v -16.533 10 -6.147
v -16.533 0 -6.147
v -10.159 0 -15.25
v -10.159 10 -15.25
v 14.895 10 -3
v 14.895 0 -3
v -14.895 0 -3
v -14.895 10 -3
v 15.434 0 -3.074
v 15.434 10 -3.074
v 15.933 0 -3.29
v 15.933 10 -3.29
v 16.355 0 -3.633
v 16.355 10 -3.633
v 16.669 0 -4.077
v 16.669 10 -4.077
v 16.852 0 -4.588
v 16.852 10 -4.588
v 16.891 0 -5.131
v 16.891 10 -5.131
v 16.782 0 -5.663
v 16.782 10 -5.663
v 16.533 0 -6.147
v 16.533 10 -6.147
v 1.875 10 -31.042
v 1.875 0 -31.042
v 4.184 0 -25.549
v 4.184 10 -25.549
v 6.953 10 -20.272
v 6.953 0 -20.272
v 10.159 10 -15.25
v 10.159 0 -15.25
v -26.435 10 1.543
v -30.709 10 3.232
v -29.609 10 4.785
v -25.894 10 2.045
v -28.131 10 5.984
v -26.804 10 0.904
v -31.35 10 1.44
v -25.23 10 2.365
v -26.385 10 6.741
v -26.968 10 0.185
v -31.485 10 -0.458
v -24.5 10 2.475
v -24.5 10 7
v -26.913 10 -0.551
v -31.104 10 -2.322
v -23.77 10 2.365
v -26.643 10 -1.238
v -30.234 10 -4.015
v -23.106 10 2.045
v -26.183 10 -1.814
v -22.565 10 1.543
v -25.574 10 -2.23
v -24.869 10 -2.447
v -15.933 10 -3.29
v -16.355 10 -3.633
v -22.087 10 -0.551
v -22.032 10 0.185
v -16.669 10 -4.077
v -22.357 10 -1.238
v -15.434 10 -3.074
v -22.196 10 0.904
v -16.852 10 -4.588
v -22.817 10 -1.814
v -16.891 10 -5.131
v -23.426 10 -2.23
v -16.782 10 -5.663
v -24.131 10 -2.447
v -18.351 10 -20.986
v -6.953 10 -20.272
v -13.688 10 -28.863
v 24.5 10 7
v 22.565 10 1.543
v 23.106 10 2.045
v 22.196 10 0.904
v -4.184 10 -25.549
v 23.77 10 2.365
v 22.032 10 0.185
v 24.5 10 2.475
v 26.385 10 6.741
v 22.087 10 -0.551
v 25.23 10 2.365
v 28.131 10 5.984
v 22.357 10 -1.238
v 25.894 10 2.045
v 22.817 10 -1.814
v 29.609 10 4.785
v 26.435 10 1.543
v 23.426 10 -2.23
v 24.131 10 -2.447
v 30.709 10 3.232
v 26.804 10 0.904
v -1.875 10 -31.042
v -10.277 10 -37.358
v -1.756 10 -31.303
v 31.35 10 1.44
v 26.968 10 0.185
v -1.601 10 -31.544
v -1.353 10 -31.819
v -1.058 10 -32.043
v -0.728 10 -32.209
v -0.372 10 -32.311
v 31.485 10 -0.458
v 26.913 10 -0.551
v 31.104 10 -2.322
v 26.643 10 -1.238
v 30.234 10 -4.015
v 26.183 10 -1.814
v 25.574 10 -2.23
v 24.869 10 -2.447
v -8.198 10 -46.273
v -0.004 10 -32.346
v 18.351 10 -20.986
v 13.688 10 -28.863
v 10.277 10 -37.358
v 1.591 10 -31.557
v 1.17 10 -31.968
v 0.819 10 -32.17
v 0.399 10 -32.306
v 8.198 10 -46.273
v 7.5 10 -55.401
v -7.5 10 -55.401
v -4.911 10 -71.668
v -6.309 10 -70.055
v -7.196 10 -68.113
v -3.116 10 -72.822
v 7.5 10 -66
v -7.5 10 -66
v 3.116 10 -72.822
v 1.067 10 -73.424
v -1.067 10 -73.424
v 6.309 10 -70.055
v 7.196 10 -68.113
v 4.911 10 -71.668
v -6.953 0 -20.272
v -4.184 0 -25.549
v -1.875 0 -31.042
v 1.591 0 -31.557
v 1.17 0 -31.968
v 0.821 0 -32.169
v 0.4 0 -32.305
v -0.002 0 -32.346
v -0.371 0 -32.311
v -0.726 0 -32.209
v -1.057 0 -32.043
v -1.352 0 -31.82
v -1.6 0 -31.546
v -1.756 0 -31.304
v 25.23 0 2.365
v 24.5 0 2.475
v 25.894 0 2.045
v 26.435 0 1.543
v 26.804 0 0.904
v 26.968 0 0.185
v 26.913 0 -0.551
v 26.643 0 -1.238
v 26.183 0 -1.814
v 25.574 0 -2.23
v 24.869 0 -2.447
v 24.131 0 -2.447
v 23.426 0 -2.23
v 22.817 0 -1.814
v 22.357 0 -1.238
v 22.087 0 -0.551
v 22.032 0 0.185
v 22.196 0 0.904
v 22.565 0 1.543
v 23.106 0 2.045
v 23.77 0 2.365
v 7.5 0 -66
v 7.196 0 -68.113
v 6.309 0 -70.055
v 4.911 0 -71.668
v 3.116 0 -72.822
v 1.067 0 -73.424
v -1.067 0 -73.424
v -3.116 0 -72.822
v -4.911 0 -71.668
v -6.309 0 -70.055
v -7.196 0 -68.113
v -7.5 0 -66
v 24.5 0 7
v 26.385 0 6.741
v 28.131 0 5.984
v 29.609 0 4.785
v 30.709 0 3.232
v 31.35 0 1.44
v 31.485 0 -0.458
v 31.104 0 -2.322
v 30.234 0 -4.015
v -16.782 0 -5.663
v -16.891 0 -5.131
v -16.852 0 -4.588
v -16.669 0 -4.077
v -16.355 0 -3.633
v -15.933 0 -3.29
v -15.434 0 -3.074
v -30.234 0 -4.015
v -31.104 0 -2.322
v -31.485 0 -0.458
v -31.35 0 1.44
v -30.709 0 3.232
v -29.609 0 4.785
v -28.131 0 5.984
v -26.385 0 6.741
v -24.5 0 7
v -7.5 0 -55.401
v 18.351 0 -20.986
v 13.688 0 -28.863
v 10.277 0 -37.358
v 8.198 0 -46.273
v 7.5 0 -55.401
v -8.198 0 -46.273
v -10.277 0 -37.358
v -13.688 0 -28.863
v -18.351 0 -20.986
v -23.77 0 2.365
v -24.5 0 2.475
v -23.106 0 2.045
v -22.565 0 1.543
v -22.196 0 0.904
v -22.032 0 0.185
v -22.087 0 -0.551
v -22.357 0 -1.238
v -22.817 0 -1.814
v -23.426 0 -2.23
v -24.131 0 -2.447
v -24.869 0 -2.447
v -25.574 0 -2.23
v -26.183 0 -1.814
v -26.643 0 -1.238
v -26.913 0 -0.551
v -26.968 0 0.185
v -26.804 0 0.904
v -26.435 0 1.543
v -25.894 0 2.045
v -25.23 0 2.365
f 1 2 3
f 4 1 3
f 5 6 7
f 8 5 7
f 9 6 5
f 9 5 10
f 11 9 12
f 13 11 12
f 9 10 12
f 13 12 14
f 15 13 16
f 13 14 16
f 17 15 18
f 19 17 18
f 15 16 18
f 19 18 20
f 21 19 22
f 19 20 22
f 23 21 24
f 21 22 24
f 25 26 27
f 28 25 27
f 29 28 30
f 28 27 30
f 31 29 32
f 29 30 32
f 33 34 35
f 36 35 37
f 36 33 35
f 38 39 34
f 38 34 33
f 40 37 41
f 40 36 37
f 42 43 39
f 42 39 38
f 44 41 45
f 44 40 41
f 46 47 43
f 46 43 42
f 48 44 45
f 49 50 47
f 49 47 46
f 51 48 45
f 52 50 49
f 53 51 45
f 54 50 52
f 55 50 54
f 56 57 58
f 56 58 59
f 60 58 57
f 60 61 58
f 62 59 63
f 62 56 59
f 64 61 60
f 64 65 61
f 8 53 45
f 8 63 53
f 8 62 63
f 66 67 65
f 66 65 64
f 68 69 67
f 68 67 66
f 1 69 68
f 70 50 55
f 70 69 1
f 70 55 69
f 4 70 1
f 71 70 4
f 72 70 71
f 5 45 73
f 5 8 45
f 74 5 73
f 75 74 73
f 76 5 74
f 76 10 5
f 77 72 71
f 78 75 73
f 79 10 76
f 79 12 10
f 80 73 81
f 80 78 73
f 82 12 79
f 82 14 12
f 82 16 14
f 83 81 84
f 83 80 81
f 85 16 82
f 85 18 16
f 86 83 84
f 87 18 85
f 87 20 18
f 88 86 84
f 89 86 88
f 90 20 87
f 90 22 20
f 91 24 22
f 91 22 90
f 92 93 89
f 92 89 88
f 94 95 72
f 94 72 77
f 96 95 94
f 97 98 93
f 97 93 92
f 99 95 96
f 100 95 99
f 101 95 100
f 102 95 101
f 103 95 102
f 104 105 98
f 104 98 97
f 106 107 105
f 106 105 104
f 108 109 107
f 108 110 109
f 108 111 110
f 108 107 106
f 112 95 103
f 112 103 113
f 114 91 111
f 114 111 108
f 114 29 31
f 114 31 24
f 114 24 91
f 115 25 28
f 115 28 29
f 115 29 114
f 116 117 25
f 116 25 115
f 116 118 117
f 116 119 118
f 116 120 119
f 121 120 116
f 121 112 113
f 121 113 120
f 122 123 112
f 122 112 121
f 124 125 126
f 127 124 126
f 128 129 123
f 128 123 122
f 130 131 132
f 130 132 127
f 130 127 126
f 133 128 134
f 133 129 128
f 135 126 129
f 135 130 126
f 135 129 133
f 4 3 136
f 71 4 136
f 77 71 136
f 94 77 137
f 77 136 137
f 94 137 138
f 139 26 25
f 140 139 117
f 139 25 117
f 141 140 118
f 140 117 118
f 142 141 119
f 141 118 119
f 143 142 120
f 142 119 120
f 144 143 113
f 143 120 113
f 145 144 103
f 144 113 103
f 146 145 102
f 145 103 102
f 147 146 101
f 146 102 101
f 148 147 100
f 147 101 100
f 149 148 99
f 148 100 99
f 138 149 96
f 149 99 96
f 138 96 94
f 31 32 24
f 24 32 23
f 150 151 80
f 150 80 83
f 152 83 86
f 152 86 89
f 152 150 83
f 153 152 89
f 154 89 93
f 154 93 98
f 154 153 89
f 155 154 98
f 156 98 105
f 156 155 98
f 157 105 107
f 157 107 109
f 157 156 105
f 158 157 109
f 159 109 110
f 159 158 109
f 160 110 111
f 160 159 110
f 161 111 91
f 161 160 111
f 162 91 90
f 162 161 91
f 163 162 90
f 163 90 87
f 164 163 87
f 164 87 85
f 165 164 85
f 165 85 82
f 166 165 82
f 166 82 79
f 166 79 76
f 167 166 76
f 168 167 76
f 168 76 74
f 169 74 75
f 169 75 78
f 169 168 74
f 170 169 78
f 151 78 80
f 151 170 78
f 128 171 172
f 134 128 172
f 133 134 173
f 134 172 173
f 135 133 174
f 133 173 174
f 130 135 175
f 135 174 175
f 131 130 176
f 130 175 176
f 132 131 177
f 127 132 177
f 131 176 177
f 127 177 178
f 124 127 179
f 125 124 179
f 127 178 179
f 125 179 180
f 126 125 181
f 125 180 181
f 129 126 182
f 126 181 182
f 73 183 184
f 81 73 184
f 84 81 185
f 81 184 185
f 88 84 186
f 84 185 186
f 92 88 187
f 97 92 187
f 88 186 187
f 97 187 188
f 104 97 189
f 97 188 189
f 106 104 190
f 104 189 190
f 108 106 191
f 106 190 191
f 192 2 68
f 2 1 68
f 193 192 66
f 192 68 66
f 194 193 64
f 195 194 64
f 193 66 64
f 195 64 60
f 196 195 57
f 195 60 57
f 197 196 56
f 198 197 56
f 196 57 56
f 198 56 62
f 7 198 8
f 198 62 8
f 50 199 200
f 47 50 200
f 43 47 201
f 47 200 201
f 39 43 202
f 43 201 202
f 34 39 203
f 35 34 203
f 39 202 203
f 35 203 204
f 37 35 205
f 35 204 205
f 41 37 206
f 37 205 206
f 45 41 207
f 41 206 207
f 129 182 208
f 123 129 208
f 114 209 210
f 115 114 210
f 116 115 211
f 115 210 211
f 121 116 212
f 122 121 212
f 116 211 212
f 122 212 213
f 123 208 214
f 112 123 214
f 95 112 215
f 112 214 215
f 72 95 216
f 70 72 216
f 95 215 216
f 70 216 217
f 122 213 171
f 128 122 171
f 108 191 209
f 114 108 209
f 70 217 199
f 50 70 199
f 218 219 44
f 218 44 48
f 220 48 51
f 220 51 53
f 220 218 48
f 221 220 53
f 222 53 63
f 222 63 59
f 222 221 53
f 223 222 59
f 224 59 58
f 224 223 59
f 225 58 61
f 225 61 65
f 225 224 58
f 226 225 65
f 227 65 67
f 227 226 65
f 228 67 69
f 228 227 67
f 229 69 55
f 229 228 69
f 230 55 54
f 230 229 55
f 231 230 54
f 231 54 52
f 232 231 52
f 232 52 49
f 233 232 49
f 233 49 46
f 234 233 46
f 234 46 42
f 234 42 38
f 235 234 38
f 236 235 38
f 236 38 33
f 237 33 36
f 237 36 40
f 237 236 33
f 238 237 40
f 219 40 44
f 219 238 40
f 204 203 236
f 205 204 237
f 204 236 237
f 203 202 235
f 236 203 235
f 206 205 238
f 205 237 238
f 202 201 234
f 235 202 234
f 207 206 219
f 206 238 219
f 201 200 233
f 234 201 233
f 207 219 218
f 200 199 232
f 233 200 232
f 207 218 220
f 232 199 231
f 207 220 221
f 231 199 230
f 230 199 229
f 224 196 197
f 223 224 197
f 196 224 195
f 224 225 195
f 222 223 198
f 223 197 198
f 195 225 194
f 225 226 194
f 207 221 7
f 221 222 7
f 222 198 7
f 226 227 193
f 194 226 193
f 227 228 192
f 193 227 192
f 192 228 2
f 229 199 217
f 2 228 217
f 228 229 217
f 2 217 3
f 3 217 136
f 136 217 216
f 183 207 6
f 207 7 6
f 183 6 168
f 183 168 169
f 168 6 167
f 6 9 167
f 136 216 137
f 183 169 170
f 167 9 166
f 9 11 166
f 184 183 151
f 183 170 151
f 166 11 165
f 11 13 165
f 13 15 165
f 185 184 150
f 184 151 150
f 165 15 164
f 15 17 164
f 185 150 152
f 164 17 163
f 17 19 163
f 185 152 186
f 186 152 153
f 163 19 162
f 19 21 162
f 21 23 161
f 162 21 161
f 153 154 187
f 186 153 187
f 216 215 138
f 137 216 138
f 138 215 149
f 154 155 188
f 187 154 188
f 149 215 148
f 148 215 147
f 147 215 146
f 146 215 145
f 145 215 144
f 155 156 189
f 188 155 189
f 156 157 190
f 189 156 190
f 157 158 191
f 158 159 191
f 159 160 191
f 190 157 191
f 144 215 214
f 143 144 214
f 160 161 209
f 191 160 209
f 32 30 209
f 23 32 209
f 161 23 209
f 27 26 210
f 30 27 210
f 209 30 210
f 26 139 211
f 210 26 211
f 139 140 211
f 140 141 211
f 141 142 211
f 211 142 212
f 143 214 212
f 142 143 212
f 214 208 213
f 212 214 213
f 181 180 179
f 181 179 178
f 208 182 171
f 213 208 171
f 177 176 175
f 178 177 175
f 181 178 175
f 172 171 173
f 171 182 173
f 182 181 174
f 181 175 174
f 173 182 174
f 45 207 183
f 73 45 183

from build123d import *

# Parameters (mm, degrees)
SKETCH_1_R      = 2.475
EXTRUDE_1_DEPTH = 10
FILLET_1_R      = 2


with BuildPart() as part:
    # Эскиз1 → Бобышка-Вытянуть1 (new body)
    with BuildSketch(Plane(origin=(0, 0, 0), x_dir=(1, 0, 0), z_dir=(0, 1, 0))):
        with BuildLine():
            Line((-7.5, 66), (-7.5, 55.400571017))
            ThreePointArc((-7.5, 55.400571017), (-10.276982955, 37.358223046), (-18.350877343, 20.985984836))
            Line((-18.350877343, 20.985984836), (-30.23406431, 4.015035054))
            ThreePointArc((-30.23406431, 4.015035054), (-30.709075832, -3.232240293), (-24.5, -7))
            Line((-24.5, -7), (24.5, -7))
            ThreePointArc((24.5, -7), (30.709075832, -3.232240293), (30.23406431, 4.015035054))
            Line((30.23406431, 4.015035054), (18.350877343, 20.985984836))
            ThreePointArc((18.350877343, 20.985984836), (10.276982955, 37.358223046), (7.5, 55.400571017))
            Line((7.5, 55.400571017), (7.5, 66))
            ThreePointArc((7.5, 66), (0, 73.5), (-7.5, 66))
        make_face()
        with Locations(Location((-24.5, 0, 0), (0, 0, 270))):
            Circle(SKETCH_1_R, mode=Mode.SUBTRACT)
        with Locations(Location((24.5, 0, 0), (0, 0, 270))):
            Circle(SKETCH_1_R, mode=Mode.SUBTRACT)
        with BuildLine():
            Line((10.1593569, 15.250220472), (18.737053619, 3))
            Line((18.737053619, 3), (-18.737053619, 3))
            Line((-18.737053619, 3), (-10.1593569, 15.250220472))
            ThreePointArc((-10.1593569, 15.250220472), (-4.1514168, 25.618747591), (0, 36.860074799))
            ThreePointArc((0, 36.860074799), (4.1514168, 25.618747591), (10.1593569, 15.250220472))
        make_face(mode=Mode.SUBTRACT)
    extrude(amount=EXTRUDE_1_DEPTH)

    # Скругление1
    fillet_1_edges = [part.edges().sort_by_distance(p)[0] for p in [
        (0, 5, -36.860074799),
        (-18.737053619, 5, -3),
        (18.737053619, 5, -3),
    ]]
    fillet(fillet_1_edges, radius=FILLET_1_R)


solid = part.part
